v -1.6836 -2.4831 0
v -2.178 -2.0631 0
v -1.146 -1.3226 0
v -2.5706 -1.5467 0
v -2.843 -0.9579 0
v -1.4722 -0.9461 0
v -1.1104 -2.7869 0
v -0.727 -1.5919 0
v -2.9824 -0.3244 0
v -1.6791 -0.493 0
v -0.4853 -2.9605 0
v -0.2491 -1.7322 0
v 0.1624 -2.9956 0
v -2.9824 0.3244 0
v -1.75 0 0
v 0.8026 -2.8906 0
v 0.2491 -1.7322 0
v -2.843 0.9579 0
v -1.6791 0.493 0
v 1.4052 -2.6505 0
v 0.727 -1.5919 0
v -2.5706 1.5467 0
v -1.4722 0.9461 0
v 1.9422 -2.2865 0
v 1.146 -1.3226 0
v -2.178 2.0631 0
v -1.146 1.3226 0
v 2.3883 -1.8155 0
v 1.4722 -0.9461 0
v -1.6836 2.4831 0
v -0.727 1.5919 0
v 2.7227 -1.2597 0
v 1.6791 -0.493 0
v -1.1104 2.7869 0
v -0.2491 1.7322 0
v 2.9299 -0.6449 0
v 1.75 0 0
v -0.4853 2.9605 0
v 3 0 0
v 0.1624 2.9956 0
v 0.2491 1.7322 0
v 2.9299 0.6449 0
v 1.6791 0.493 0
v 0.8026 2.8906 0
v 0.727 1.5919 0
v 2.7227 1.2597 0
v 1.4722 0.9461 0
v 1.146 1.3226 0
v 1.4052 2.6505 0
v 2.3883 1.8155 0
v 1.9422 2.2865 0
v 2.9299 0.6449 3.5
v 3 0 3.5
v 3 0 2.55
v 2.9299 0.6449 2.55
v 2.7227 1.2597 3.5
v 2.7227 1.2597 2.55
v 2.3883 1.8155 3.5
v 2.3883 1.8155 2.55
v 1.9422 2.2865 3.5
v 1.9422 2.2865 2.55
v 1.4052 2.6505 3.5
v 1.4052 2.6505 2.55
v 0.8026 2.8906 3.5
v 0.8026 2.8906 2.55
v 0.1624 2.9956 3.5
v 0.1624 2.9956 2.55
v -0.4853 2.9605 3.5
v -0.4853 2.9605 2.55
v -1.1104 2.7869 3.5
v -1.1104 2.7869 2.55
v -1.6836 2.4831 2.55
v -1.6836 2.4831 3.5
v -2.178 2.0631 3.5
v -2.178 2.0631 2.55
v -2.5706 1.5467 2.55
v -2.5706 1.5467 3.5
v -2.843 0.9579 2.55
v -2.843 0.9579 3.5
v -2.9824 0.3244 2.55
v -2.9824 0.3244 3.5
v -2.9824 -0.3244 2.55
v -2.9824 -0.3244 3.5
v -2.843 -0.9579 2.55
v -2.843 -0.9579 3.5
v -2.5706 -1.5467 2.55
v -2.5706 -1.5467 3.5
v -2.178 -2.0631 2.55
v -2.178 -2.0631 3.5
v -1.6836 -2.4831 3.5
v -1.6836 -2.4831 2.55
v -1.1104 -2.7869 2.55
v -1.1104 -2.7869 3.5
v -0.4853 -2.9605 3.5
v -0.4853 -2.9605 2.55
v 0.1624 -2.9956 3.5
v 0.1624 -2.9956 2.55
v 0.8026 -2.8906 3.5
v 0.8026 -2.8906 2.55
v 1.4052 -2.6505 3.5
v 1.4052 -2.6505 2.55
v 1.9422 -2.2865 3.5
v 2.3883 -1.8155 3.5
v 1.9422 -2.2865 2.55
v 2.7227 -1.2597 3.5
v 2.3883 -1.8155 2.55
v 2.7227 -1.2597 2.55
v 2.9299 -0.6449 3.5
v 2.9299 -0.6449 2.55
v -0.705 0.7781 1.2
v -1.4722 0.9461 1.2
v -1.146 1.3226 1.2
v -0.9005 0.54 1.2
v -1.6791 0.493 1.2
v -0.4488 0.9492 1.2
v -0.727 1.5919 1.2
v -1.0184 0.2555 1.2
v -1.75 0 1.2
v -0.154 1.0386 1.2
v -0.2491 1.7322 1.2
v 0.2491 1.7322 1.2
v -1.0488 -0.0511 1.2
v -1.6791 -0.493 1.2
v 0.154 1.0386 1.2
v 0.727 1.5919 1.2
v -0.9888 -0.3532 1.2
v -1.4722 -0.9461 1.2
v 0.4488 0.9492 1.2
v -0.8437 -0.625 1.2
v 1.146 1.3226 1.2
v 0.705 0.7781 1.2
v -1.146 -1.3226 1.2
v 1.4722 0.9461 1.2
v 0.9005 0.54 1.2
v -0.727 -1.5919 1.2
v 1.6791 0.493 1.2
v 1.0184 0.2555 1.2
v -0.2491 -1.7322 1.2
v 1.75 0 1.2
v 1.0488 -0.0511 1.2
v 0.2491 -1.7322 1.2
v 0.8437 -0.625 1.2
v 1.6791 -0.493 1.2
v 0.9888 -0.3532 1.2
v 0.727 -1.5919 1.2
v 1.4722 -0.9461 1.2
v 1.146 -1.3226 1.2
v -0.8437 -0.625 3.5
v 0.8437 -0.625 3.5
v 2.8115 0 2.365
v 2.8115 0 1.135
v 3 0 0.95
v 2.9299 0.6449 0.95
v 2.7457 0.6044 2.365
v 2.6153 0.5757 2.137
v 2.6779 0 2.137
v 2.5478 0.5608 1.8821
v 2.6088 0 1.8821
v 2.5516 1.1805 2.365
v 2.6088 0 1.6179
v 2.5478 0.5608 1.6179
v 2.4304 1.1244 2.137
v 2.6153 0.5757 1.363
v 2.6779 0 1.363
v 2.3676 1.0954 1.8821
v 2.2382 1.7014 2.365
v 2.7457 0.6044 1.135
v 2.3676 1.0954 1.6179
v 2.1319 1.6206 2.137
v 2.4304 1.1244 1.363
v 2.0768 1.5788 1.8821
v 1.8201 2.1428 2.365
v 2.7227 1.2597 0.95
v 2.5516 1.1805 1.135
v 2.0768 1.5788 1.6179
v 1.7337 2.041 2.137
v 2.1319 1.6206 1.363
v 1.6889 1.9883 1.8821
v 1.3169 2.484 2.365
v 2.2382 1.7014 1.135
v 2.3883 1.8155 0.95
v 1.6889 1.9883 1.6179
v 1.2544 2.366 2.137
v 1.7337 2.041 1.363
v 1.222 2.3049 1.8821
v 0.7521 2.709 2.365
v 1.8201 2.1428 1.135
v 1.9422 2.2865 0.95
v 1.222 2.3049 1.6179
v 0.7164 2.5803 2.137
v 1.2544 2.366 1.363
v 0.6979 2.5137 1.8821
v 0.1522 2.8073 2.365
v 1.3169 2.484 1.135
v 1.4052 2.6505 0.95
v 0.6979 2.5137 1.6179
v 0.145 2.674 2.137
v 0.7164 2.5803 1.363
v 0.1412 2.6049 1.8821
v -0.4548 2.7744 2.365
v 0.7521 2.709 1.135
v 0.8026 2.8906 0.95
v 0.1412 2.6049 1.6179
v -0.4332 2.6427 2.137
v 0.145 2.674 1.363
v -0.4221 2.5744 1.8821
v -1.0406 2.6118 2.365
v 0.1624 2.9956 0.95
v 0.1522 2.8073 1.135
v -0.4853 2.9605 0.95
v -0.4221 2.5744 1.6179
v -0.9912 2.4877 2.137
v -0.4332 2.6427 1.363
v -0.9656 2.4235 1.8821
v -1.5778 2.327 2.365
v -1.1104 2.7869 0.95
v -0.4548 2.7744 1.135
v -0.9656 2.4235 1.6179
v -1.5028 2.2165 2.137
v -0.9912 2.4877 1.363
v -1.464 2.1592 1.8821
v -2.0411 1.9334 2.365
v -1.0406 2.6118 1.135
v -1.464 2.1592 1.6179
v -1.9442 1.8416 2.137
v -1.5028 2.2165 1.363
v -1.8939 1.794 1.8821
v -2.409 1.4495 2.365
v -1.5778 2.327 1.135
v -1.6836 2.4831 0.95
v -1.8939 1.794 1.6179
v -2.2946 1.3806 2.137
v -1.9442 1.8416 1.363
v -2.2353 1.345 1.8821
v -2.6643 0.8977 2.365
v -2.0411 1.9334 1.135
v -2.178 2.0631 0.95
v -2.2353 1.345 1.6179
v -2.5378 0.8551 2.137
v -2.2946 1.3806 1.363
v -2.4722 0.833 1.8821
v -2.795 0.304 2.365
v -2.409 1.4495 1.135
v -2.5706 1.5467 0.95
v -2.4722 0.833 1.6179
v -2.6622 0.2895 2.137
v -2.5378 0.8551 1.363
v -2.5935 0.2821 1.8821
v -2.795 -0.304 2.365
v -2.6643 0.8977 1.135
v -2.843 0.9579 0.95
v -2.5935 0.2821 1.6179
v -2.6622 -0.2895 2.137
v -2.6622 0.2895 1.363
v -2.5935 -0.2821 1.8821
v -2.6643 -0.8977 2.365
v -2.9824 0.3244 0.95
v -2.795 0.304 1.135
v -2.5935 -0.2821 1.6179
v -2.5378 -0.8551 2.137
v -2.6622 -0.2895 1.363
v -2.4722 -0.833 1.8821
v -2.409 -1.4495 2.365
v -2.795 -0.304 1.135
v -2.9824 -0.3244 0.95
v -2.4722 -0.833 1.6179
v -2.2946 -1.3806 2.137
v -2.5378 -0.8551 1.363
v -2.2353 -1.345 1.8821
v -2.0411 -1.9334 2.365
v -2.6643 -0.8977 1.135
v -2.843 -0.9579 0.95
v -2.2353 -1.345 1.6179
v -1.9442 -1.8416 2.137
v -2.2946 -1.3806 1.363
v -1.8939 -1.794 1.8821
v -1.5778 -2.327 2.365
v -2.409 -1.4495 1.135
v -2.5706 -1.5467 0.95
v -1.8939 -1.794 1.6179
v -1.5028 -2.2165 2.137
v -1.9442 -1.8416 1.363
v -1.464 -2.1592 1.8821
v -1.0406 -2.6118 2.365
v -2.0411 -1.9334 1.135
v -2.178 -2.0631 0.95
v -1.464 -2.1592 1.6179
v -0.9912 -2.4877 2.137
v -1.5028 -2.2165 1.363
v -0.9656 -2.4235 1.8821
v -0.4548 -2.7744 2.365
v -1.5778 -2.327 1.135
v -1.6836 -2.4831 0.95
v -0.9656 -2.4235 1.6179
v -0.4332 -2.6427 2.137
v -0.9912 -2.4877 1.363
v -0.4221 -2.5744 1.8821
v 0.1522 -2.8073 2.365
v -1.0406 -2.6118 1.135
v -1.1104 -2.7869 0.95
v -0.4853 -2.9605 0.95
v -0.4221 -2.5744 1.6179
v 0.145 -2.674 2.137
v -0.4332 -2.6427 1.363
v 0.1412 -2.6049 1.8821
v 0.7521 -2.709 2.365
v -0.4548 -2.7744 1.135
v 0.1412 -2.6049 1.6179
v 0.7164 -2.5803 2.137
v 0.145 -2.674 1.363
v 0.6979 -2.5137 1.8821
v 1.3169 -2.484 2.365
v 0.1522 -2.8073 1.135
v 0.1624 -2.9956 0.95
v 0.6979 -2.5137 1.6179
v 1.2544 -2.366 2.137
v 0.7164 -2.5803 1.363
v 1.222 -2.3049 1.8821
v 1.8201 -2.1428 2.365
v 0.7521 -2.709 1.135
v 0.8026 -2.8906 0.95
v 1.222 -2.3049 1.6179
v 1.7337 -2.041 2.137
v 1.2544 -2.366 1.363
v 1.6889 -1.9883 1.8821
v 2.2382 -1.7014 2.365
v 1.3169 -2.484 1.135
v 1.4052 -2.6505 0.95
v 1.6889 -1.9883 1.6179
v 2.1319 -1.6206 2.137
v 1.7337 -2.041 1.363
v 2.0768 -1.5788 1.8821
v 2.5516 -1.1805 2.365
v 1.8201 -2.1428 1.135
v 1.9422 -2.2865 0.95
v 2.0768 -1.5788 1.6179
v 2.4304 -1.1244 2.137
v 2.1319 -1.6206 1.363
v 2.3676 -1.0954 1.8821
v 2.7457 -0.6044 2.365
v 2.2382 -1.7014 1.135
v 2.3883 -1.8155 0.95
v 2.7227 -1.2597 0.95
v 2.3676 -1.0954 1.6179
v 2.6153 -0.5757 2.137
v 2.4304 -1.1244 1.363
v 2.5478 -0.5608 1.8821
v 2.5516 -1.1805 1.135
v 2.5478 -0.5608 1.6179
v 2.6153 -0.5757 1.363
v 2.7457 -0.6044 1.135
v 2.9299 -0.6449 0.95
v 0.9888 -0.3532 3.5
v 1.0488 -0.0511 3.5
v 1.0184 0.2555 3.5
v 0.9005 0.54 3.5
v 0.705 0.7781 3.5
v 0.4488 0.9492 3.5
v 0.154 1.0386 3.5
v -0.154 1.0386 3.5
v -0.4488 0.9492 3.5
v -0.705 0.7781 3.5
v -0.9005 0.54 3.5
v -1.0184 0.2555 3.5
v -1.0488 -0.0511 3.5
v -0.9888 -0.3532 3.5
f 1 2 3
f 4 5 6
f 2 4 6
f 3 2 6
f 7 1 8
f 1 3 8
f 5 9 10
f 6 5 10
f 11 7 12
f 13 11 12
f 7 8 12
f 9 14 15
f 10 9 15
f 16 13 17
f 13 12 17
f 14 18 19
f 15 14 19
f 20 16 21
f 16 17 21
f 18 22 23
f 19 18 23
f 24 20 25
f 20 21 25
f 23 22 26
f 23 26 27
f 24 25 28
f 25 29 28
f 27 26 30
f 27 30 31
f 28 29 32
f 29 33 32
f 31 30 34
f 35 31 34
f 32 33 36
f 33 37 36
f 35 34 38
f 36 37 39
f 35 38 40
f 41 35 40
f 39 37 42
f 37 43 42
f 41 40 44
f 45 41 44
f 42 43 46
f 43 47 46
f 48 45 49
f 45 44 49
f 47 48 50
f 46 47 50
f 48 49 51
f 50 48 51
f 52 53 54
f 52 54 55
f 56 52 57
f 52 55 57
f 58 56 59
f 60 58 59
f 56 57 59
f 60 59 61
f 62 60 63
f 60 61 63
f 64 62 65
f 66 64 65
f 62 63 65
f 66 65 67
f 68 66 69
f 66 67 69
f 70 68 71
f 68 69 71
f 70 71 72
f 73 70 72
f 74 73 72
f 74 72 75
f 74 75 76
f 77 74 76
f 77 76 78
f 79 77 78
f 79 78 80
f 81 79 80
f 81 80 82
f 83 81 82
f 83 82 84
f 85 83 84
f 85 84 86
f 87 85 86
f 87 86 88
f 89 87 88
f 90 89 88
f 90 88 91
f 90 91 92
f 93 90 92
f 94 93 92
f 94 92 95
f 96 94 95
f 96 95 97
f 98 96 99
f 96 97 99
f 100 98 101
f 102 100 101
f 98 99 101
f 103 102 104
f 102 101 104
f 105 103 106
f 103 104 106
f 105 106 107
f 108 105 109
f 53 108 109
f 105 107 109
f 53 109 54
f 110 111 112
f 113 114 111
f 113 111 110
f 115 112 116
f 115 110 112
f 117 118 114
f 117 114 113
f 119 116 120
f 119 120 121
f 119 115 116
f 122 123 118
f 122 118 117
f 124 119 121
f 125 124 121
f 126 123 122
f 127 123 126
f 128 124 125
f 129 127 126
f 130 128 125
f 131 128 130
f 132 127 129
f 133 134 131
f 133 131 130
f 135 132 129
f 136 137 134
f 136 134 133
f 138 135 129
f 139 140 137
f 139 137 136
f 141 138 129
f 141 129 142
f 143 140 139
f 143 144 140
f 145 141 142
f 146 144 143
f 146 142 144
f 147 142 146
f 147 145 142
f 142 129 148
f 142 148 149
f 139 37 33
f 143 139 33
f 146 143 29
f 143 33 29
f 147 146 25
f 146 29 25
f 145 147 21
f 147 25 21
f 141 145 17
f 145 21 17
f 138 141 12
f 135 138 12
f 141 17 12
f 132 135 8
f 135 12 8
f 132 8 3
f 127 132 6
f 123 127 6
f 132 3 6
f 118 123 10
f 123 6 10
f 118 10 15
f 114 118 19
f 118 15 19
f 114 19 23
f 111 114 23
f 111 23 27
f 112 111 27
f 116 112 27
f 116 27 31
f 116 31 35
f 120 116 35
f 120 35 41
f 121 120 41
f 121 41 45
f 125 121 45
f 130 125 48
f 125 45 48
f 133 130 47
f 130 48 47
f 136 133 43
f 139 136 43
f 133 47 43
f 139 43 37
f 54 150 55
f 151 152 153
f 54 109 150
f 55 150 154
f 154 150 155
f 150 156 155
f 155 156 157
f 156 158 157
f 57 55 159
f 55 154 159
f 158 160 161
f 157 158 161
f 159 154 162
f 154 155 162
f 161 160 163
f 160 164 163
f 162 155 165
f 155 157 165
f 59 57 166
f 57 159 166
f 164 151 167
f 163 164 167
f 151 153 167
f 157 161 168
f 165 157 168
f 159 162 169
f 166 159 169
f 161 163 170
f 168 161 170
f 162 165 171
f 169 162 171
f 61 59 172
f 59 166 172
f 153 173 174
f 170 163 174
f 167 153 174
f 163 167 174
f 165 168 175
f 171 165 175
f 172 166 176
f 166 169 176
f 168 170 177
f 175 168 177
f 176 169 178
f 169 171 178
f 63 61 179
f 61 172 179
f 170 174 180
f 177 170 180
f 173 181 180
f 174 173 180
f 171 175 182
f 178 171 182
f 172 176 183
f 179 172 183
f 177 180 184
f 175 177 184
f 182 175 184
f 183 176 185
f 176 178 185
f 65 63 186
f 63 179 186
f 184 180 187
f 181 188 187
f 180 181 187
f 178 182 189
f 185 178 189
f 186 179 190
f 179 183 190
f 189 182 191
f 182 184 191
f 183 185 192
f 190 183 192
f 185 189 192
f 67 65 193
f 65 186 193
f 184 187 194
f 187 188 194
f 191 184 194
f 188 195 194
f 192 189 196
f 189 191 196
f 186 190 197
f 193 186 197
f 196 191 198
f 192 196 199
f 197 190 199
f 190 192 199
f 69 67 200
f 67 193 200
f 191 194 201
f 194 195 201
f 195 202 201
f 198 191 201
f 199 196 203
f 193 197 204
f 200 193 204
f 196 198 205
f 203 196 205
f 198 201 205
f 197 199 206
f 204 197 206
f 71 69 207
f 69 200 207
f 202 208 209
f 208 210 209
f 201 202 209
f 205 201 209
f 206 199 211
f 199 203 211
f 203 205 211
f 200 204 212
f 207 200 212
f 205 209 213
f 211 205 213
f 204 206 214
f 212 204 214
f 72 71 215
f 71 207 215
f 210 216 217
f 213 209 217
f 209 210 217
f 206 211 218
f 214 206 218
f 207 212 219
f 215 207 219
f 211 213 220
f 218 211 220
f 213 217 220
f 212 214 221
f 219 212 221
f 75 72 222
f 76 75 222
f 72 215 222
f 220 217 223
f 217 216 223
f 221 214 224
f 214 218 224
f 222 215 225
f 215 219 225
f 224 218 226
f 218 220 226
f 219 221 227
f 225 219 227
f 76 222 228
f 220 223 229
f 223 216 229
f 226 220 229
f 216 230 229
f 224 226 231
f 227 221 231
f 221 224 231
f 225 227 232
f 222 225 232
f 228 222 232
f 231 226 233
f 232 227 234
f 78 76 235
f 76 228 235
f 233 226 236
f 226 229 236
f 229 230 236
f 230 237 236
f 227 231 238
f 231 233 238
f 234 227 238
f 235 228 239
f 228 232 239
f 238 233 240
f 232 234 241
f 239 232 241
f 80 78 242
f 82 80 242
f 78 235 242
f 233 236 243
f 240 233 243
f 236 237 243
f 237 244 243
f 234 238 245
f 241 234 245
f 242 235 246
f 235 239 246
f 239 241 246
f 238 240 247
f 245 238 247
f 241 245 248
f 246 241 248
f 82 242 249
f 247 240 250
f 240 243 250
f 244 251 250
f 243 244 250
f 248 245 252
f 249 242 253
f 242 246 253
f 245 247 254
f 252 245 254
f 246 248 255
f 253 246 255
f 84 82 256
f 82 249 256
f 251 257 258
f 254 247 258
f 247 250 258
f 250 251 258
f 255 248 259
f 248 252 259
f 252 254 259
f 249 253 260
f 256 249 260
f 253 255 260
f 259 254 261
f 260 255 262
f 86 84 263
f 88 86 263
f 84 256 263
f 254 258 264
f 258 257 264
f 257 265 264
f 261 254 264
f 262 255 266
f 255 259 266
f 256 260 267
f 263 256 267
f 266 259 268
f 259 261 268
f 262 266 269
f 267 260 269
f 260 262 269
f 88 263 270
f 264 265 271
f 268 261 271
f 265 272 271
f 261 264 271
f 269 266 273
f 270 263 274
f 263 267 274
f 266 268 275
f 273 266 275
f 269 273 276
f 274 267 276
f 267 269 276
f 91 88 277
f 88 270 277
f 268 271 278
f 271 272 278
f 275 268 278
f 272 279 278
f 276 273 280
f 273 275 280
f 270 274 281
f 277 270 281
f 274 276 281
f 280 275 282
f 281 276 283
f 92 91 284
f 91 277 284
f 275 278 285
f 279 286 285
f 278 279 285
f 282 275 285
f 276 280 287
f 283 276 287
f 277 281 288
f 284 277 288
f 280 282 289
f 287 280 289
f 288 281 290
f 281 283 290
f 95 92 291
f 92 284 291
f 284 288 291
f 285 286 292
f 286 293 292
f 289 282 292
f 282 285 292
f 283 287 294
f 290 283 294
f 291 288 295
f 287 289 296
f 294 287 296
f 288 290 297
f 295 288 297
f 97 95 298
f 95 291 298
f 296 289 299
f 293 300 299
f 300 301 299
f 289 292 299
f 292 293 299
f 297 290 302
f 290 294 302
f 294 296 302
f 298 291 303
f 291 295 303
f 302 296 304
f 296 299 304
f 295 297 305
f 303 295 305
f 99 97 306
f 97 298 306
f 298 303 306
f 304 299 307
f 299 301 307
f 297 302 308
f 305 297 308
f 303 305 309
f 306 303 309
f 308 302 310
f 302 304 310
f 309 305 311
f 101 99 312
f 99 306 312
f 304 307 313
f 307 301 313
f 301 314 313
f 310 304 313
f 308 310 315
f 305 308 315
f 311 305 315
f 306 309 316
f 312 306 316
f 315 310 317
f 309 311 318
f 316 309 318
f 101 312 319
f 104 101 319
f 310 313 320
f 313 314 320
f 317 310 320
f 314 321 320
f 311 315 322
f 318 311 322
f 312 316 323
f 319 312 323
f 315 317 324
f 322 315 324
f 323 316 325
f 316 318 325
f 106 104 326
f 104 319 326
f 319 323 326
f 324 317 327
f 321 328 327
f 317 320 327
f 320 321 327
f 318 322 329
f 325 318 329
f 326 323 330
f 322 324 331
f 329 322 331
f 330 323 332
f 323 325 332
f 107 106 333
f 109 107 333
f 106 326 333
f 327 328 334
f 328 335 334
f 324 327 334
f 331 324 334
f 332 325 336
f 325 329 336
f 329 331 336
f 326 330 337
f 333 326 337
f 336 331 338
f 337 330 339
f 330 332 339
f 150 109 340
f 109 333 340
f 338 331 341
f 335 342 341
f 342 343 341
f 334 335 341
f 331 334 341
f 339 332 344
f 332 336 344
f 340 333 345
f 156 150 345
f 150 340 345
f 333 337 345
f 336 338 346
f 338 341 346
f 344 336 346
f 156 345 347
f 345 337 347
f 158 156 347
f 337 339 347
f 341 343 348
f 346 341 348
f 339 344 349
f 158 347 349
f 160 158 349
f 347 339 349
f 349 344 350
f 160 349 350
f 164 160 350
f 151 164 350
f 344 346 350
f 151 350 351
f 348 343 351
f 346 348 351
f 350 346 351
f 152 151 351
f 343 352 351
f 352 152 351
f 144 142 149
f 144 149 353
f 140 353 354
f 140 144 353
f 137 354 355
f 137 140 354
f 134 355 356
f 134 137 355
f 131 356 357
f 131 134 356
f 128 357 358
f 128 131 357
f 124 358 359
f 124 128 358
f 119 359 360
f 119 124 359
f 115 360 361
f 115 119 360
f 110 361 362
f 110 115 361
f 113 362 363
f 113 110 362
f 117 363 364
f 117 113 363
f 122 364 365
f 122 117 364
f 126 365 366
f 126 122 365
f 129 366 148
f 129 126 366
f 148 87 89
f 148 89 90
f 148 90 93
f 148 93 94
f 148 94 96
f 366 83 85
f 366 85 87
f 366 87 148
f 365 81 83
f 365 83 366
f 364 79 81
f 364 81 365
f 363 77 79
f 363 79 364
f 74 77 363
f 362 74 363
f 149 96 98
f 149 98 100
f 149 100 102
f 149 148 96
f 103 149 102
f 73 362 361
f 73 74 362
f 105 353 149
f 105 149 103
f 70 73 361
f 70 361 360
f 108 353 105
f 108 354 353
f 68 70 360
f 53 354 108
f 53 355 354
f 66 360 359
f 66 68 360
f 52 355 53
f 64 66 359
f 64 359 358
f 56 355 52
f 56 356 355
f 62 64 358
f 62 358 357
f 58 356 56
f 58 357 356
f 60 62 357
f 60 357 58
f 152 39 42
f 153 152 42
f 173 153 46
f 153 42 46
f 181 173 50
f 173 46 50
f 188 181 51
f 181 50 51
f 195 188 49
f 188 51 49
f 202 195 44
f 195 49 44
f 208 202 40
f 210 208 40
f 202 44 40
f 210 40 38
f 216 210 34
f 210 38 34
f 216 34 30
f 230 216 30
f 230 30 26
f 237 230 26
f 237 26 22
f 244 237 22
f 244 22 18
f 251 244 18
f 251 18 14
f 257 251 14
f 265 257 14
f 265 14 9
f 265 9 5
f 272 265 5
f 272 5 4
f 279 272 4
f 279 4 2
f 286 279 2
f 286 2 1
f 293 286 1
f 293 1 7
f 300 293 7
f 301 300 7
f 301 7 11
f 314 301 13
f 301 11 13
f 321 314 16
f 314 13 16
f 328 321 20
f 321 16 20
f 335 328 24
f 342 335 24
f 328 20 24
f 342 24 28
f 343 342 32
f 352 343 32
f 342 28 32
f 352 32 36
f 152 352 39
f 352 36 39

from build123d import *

# Parameters (mm, degrees)
SKETCH_R     = 3
PAD_DEPTH    = 3.5
SKETCH002_R  = 1.75
POCKET_DEPTH = 1.2
TORUS_R      = 1


with BuildPart() as part:
    # Sketch → Pad (new body)
    with BuildSketch(Plane.XY):
        Circle(SKETCH_R)
        with BuildLine():
            ThreePointArc((0.843727, -0.625), (0, 1.05), (-0.843727, -0.625))
            Line((-0.843727, -0.625), (0.843727, -0.625))
        make_face(mode=Mode.SUBTRACT)
    extrude(amount=PAD_DEPTH)

    # Sketch002 (on Face4 of Pad) → Pocket (cut)
    with BuildSketch(Plane(origin=(0, 0, 0), x_dir=(1, 0, 0), z_dir=(0, 0, -1))):
        Circle(SKETCH002_R)
    extrude(amount=-POCKET_DEPTH, mode=Mode.SUBTRACT)

    # Torus → Torus (revolve, cut)
    with BuildSketch(Plane(origin=(0, 0, 1.75), x_dir=(1, 0, 0), z_dir=(0, -1, 0))):
        with Locations((3.6, 0)):
            Circle(TORUS_R)
    revolve(axis=Axis((0, 0, 1.75), (0, 0, 1)), mode=Mode.SUBTRACT)


solid = part.part
